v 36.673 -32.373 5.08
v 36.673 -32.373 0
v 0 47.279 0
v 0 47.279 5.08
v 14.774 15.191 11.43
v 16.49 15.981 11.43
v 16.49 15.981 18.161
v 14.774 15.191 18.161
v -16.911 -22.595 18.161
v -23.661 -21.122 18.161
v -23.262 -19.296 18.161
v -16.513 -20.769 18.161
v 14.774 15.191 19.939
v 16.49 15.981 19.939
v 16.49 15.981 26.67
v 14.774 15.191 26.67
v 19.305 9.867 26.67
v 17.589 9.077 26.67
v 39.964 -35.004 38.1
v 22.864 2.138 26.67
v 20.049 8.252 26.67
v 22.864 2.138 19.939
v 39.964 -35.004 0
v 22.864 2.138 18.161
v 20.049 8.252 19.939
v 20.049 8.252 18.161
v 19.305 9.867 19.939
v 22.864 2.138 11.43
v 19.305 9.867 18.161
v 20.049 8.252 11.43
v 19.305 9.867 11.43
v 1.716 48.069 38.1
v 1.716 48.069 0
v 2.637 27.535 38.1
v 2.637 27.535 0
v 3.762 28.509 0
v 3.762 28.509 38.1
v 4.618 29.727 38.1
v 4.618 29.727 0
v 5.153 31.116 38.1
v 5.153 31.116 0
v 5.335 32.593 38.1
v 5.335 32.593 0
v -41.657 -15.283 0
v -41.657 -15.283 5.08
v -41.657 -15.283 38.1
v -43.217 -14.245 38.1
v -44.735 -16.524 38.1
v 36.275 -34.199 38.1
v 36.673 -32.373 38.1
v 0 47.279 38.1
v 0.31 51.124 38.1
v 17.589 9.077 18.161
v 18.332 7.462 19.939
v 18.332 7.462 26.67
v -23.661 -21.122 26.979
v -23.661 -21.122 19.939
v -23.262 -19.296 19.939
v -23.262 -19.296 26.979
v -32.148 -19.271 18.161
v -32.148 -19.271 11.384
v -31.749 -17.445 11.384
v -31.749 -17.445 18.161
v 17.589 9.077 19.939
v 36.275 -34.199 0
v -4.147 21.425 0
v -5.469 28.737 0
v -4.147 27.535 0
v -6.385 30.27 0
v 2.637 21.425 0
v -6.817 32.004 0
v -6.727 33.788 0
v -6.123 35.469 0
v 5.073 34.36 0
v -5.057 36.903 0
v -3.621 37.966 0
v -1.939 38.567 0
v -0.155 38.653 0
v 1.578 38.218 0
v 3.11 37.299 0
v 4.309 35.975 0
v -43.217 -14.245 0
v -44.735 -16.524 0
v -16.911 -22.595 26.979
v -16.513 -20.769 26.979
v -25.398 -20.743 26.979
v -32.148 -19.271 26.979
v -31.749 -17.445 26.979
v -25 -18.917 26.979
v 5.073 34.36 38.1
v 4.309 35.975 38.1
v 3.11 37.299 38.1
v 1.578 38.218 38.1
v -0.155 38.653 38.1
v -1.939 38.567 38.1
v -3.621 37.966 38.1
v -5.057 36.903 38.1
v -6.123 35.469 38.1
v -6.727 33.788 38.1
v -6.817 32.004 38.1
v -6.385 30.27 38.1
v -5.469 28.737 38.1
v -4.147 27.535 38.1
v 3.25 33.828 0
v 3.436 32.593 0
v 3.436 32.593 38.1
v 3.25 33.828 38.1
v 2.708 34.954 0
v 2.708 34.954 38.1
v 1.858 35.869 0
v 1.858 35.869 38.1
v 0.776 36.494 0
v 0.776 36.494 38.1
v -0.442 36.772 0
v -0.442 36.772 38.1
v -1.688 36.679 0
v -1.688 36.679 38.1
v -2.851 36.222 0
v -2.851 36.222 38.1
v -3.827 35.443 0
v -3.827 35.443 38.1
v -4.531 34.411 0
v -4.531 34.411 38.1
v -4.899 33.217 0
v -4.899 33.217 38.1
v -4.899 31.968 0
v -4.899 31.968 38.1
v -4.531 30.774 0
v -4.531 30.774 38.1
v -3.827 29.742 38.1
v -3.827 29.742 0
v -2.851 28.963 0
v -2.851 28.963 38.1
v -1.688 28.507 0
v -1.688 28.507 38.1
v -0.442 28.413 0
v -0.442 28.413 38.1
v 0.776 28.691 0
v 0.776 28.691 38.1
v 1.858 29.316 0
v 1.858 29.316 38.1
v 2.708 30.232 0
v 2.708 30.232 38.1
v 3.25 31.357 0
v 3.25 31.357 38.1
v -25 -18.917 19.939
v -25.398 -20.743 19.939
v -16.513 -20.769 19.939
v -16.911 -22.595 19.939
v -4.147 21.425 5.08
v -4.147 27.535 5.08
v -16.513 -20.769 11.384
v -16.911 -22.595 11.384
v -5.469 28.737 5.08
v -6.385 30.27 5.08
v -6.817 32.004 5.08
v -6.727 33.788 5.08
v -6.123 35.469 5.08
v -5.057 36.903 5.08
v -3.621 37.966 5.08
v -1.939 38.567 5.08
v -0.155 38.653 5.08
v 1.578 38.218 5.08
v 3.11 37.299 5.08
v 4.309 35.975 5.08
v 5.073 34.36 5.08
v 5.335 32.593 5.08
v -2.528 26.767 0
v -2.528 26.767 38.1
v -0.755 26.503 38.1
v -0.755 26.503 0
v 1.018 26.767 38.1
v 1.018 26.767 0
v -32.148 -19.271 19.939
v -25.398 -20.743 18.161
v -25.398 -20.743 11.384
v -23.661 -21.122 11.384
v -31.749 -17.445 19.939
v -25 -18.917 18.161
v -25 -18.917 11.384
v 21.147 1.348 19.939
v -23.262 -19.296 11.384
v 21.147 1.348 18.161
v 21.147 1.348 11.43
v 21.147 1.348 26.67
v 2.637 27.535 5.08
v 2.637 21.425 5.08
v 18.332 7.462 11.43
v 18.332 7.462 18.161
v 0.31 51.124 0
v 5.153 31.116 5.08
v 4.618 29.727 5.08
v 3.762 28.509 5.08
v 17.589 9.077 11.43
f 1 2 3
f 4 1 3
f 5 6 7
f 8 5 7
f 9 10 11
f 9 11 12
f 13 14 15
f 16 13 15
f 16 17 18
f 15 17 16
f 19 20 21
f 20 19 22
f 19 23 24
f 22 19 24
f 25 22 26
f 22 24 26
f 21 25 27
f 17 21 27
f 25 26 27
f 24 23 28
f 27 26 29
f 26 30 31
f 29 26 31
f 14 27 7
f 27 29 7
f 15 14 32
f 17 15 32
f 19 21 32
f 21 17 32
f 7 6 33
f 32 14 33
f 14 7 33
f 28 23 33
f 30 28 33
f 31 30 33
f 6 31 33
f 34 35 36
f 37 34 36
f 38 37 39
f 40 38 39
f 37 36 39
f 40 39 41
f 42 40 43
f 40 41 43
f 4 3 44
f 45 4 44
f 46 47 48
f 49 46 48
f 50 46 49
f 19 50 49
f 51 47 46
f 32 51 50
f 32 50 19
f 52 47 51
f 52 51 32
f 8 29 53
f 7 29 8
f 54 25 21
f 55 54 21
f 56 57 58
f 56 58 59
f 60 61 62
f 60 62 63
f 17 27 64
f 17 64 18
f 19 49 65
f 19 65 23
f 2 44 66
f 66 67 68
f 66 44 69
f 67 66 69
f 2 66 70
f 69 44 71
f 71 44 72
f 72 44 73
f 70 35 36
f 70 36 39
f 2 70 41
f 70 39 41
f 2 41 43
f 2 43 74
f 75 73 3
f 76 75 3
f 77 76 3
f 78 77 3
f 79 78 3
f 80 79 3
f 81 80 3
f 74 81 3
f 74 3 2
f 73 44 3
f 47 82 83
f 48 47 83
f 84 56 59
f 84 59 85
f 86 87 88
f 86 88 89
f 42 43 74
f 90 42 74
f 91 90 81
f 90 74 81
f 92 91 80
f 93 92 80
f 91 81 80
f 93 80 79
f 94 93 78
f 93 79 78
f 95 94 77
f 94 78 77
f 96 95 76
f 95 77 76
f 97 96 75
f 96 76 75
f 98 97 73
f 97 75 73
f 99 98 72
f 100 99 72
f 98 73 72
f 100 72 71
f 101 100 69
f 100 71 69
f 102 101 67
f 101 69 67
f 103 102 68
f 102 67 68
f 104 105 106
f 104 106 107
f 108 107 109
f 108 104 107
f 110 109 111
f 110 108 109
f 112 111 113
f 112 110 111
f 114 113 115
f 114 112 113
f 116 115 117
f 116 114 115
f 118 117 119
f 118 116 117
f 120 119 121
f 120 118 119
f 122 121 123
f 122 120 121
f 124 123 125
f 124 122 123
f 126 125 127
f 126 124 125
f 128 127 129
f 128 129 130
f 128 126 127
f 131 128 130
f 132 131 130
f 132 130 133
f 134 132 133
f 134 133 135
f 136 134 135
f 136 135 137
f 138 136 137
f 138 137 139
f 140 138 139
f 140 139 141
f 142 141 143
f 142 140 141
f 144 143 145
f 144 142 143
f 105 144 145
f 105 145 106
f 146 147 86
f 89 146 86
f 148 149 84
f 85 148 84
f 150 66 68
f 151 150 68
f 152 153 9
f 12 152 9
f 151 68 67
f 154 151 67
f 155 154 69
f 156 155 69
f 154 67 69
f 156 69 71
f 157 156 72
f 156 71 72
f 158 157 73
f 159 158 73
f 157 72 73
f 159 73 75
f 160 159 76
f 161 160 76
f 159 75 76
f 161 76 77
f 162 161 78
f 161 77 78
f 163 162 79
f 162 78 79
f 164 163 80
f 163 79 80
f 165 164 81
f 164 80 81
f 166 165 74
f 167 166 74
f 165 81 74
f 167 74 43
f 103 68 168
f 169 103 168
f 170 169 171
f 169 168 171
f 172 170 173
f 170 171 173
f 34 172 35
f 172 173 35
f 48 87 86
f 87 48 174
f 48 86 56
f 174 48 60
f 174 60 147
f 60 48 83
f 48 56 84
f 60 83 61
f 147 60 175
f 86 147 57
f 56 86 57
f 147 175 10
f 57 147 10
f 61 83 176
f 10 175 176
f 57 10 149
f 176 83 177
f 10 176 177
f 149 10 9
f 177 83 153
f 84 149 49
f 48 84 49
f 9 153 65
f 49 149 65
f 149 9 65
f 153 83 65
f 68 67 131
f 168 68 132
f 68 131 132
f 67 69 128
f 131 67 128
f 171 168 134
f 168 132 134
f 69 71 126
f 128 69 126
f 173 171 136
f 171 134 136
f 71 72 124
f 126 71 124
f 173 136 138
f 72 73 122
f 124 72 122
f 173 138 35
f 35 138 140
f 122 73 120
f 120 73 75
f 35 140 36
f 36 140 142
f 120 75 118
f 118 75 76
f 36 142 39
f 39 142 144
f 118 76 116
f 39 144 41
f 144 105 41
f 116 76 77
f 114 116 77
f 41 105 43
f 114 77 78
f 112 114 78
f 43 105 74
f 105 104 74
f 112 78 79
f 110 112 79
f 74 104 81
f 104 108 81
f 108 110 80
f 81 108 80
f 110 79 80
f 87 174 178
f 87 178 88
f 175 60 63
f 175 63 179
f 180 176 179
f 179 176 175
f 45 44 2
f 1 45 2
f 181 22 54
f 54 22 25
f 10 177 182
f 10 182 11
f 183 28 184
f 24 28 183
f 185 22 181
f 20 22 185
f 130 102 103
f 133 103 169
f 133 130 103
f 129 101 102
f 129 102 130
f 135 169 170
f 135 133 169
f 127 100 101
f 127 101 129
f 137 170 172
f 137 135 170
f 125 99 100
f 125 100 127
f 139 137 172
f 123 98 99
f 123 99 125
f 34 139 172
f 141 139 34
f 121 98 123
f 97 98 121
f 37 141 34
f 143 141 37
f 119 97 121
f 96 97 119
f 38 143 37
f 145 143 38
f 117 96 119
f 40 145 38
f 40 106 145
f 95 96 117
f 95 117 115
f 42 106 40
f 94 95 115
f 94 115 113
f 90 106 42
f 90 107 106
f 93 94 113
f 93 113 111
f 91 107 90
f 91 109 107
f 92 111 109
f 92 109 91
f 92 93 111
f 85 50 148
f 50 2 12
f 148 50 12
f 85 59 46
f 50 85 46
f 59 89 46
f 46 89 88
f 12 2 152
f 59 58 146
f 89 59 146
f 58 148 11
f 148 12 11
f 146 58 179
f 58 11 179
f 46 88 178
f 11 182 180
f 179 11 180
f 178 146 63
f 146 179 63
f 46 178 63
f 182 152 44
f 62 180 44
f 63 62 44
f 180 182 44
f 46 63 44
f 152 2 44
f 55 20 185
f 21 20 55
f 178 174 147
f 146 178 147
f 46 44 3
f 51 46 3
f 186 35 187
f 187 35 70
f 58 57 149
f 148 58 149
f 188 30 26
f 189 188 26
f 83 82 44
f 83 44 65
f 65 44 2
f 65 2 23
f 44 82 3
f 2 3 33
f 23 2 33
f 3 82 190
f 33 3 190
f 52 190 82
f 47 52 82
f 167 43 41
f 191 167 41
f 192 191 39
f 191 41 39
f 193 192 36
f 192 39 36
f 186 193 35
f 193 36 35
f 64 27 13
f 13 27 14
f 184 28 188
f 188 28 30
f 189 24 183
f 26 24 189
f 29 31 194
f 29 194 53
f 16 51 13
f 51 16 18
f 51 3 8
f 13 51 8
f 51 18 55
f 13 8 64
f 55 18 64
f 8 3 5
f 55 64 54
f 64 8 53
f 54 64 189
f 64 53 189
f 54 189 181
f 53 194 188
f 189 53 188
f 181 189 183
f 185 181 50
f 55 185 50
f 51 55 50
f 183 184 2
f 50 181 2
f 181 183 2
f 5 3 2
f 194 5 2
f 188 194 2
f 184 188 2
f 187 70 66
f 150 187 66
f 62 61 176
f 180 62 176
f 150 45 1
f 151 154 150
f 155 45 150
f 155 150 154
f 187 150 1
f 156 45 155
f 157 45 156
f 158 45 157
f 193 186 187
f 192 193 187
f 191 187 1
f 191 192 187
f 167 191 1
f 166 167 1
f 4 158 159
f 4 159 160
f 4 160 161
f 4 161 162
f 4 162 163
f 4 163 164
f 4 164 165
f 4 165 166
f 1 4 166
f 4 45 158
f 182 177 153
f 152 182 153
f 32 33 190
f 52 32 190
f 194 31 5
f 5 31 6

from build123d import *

# Parameters (mm, degrees)
F1_DEPTH = 38.1
F0_R     = 4.191
F2_DEPTH = 5.08
F3_W     = 6.9084239401
F3_H     = 7.0400872709
F3_H_2   = 6.7767606093
F4_DEPTH = 1.905
F5_W     = 6.731
F5_H     = 6.731
F6_DEPTH = 2.54


# Not quite as in the source:
# - a feature names something its author has since deleted; it is built from what else it names


with BuildPart() as f1:
    # F0 (on Top) → F1 (new body)
    with BuildSketch(Plane.XY):
        Polygon((0.3095794826, 51.1243626163), (-43.2167308403, -14.2446323873), (-44.7347259133, -16.5243986163), (36.2745233354, -34.199096887), (39.9642340225, -35.0041225317), (1.7162043522, 48.0692239296), align=None)
        Polygon((-41.6572931301, -15.282992694), (0, 47.2790615276), (36.6729057896, -32.3731724479), align=None, mode=Mode.SUBTRACT)
    extrude(amount=F1_DEPTH)

    # F3 (on face) → F4 (cut)
    with BuildSketch(Plane(origin=(-5.4742330467, -25.0903015448, 0), x_dir=(0.9770158795, -0.2131665339, 0), z_dir=(-0.2131665339, -0.9770158795, 0))):
        with Locations((-23.8466220251, 23.4590436355)):
            Rectangle(F3_W, F3_H)
        with Locations((-23.8466220251, 14.7726196953)):
            Rectangle(F3_W, F3_H_2)
        with Locations((-15.1601980849, 14.7726196953)):
            Rectangle(F3_W, F3_H_2)
        with Locations((-15.1601980849, 23.4590436355)):
            Rectangle(F3_W, F3_H)
    extrude(amount=-F4_DEPTH, mode=Mode.SUBTRACT)

    # F5 (on face) → F6 (cut)
    with BuildSketch(Plane(origin=(19.6768020366, 9.0594509571, 0), x_dir=(-0.4182150426, 0.908348049, 0), z_dir=(0.908348049, 0.4182150426, 0))):
        with Locations((-4.2545, 23.3045)):
            Rectangle(F5_W, F5_H)
        with Locations((-4.2545, 14.7955)):
            Rectangle(F5_W, F5_H)
        with Locations((4.2545, 14.7955)):
            Rectangle(F5_W, F5_H)
        with Locations((4.2545, 23.3045)):
            Rectangle(F5_W, F5_H)
    extrude(amount=-F6_DEPTH, mode=Mode.SUBTRACT)


with BuildPart() as f1b:
    # F0 (on Top) → F1, piece 2 (new body)
    with BuildSketch(Plane.XY):
        with BuildLine():
            ThreePointArc((2.6368516072, 27.5348942884), (4.6181244636, 29.726524701), (5.3347704338, 32.5927250691))
            ThreePointArc((5.3347704338, 32.5927250691), (-3.6213867329, 37.9660358976), (-4.1472243368, 27.5348942884))
            ThreePointArc((-4.1472243368, 27.5348942884), (-0.7551863648, 26.5027682705), (2.6368516072, 27.5348942884))
        make_face()
        with Locations((-0.7551863648, 32.5927250691)):
            Circle(F0_R, mode=Mode.SUBTRACT)
    extrude(amount=F1_DEPTH)


with BuildPart() as f2:
    # F0 (on Top) → F2 (new body)
    with BuildSketch(Plane.XY):
        Polygon((36.6729057896, -32.3731724479), (0, 47.2790615276), (-41.6572931301, -15.282992694), align=None)
        with BuildLine():
            ThreePointArc((-4.1472243368, 27.5348942884), (-3.6213867329, 37.9660358976), (5.3347704338, 32.5927250691))
            ThreePointArc((5.3347704338, 32.5927250691), (4.6181244636, 29.726524701), (2.6368516072, 27.5348942884))
            Line((2.6368516072, 27.5348942884), (2.6368516072, 21.4253379491))
            Line((2.6368516072, 21.4253379491), (-0.7551863648, 21.4253379491))
            Line((-0.7551863648, 21.4253379491), (-4.1472243368, 21.4253379491))
            Line((-4.1472243368, 21.4253379491), (-4.1472243368, 27.5348942884))
        make_face(mode=Mode.SUBTRACT)
    extrude(amount=F2_DEPTH)


solid = Compound([f1.part, f1b.part, f2.part])
